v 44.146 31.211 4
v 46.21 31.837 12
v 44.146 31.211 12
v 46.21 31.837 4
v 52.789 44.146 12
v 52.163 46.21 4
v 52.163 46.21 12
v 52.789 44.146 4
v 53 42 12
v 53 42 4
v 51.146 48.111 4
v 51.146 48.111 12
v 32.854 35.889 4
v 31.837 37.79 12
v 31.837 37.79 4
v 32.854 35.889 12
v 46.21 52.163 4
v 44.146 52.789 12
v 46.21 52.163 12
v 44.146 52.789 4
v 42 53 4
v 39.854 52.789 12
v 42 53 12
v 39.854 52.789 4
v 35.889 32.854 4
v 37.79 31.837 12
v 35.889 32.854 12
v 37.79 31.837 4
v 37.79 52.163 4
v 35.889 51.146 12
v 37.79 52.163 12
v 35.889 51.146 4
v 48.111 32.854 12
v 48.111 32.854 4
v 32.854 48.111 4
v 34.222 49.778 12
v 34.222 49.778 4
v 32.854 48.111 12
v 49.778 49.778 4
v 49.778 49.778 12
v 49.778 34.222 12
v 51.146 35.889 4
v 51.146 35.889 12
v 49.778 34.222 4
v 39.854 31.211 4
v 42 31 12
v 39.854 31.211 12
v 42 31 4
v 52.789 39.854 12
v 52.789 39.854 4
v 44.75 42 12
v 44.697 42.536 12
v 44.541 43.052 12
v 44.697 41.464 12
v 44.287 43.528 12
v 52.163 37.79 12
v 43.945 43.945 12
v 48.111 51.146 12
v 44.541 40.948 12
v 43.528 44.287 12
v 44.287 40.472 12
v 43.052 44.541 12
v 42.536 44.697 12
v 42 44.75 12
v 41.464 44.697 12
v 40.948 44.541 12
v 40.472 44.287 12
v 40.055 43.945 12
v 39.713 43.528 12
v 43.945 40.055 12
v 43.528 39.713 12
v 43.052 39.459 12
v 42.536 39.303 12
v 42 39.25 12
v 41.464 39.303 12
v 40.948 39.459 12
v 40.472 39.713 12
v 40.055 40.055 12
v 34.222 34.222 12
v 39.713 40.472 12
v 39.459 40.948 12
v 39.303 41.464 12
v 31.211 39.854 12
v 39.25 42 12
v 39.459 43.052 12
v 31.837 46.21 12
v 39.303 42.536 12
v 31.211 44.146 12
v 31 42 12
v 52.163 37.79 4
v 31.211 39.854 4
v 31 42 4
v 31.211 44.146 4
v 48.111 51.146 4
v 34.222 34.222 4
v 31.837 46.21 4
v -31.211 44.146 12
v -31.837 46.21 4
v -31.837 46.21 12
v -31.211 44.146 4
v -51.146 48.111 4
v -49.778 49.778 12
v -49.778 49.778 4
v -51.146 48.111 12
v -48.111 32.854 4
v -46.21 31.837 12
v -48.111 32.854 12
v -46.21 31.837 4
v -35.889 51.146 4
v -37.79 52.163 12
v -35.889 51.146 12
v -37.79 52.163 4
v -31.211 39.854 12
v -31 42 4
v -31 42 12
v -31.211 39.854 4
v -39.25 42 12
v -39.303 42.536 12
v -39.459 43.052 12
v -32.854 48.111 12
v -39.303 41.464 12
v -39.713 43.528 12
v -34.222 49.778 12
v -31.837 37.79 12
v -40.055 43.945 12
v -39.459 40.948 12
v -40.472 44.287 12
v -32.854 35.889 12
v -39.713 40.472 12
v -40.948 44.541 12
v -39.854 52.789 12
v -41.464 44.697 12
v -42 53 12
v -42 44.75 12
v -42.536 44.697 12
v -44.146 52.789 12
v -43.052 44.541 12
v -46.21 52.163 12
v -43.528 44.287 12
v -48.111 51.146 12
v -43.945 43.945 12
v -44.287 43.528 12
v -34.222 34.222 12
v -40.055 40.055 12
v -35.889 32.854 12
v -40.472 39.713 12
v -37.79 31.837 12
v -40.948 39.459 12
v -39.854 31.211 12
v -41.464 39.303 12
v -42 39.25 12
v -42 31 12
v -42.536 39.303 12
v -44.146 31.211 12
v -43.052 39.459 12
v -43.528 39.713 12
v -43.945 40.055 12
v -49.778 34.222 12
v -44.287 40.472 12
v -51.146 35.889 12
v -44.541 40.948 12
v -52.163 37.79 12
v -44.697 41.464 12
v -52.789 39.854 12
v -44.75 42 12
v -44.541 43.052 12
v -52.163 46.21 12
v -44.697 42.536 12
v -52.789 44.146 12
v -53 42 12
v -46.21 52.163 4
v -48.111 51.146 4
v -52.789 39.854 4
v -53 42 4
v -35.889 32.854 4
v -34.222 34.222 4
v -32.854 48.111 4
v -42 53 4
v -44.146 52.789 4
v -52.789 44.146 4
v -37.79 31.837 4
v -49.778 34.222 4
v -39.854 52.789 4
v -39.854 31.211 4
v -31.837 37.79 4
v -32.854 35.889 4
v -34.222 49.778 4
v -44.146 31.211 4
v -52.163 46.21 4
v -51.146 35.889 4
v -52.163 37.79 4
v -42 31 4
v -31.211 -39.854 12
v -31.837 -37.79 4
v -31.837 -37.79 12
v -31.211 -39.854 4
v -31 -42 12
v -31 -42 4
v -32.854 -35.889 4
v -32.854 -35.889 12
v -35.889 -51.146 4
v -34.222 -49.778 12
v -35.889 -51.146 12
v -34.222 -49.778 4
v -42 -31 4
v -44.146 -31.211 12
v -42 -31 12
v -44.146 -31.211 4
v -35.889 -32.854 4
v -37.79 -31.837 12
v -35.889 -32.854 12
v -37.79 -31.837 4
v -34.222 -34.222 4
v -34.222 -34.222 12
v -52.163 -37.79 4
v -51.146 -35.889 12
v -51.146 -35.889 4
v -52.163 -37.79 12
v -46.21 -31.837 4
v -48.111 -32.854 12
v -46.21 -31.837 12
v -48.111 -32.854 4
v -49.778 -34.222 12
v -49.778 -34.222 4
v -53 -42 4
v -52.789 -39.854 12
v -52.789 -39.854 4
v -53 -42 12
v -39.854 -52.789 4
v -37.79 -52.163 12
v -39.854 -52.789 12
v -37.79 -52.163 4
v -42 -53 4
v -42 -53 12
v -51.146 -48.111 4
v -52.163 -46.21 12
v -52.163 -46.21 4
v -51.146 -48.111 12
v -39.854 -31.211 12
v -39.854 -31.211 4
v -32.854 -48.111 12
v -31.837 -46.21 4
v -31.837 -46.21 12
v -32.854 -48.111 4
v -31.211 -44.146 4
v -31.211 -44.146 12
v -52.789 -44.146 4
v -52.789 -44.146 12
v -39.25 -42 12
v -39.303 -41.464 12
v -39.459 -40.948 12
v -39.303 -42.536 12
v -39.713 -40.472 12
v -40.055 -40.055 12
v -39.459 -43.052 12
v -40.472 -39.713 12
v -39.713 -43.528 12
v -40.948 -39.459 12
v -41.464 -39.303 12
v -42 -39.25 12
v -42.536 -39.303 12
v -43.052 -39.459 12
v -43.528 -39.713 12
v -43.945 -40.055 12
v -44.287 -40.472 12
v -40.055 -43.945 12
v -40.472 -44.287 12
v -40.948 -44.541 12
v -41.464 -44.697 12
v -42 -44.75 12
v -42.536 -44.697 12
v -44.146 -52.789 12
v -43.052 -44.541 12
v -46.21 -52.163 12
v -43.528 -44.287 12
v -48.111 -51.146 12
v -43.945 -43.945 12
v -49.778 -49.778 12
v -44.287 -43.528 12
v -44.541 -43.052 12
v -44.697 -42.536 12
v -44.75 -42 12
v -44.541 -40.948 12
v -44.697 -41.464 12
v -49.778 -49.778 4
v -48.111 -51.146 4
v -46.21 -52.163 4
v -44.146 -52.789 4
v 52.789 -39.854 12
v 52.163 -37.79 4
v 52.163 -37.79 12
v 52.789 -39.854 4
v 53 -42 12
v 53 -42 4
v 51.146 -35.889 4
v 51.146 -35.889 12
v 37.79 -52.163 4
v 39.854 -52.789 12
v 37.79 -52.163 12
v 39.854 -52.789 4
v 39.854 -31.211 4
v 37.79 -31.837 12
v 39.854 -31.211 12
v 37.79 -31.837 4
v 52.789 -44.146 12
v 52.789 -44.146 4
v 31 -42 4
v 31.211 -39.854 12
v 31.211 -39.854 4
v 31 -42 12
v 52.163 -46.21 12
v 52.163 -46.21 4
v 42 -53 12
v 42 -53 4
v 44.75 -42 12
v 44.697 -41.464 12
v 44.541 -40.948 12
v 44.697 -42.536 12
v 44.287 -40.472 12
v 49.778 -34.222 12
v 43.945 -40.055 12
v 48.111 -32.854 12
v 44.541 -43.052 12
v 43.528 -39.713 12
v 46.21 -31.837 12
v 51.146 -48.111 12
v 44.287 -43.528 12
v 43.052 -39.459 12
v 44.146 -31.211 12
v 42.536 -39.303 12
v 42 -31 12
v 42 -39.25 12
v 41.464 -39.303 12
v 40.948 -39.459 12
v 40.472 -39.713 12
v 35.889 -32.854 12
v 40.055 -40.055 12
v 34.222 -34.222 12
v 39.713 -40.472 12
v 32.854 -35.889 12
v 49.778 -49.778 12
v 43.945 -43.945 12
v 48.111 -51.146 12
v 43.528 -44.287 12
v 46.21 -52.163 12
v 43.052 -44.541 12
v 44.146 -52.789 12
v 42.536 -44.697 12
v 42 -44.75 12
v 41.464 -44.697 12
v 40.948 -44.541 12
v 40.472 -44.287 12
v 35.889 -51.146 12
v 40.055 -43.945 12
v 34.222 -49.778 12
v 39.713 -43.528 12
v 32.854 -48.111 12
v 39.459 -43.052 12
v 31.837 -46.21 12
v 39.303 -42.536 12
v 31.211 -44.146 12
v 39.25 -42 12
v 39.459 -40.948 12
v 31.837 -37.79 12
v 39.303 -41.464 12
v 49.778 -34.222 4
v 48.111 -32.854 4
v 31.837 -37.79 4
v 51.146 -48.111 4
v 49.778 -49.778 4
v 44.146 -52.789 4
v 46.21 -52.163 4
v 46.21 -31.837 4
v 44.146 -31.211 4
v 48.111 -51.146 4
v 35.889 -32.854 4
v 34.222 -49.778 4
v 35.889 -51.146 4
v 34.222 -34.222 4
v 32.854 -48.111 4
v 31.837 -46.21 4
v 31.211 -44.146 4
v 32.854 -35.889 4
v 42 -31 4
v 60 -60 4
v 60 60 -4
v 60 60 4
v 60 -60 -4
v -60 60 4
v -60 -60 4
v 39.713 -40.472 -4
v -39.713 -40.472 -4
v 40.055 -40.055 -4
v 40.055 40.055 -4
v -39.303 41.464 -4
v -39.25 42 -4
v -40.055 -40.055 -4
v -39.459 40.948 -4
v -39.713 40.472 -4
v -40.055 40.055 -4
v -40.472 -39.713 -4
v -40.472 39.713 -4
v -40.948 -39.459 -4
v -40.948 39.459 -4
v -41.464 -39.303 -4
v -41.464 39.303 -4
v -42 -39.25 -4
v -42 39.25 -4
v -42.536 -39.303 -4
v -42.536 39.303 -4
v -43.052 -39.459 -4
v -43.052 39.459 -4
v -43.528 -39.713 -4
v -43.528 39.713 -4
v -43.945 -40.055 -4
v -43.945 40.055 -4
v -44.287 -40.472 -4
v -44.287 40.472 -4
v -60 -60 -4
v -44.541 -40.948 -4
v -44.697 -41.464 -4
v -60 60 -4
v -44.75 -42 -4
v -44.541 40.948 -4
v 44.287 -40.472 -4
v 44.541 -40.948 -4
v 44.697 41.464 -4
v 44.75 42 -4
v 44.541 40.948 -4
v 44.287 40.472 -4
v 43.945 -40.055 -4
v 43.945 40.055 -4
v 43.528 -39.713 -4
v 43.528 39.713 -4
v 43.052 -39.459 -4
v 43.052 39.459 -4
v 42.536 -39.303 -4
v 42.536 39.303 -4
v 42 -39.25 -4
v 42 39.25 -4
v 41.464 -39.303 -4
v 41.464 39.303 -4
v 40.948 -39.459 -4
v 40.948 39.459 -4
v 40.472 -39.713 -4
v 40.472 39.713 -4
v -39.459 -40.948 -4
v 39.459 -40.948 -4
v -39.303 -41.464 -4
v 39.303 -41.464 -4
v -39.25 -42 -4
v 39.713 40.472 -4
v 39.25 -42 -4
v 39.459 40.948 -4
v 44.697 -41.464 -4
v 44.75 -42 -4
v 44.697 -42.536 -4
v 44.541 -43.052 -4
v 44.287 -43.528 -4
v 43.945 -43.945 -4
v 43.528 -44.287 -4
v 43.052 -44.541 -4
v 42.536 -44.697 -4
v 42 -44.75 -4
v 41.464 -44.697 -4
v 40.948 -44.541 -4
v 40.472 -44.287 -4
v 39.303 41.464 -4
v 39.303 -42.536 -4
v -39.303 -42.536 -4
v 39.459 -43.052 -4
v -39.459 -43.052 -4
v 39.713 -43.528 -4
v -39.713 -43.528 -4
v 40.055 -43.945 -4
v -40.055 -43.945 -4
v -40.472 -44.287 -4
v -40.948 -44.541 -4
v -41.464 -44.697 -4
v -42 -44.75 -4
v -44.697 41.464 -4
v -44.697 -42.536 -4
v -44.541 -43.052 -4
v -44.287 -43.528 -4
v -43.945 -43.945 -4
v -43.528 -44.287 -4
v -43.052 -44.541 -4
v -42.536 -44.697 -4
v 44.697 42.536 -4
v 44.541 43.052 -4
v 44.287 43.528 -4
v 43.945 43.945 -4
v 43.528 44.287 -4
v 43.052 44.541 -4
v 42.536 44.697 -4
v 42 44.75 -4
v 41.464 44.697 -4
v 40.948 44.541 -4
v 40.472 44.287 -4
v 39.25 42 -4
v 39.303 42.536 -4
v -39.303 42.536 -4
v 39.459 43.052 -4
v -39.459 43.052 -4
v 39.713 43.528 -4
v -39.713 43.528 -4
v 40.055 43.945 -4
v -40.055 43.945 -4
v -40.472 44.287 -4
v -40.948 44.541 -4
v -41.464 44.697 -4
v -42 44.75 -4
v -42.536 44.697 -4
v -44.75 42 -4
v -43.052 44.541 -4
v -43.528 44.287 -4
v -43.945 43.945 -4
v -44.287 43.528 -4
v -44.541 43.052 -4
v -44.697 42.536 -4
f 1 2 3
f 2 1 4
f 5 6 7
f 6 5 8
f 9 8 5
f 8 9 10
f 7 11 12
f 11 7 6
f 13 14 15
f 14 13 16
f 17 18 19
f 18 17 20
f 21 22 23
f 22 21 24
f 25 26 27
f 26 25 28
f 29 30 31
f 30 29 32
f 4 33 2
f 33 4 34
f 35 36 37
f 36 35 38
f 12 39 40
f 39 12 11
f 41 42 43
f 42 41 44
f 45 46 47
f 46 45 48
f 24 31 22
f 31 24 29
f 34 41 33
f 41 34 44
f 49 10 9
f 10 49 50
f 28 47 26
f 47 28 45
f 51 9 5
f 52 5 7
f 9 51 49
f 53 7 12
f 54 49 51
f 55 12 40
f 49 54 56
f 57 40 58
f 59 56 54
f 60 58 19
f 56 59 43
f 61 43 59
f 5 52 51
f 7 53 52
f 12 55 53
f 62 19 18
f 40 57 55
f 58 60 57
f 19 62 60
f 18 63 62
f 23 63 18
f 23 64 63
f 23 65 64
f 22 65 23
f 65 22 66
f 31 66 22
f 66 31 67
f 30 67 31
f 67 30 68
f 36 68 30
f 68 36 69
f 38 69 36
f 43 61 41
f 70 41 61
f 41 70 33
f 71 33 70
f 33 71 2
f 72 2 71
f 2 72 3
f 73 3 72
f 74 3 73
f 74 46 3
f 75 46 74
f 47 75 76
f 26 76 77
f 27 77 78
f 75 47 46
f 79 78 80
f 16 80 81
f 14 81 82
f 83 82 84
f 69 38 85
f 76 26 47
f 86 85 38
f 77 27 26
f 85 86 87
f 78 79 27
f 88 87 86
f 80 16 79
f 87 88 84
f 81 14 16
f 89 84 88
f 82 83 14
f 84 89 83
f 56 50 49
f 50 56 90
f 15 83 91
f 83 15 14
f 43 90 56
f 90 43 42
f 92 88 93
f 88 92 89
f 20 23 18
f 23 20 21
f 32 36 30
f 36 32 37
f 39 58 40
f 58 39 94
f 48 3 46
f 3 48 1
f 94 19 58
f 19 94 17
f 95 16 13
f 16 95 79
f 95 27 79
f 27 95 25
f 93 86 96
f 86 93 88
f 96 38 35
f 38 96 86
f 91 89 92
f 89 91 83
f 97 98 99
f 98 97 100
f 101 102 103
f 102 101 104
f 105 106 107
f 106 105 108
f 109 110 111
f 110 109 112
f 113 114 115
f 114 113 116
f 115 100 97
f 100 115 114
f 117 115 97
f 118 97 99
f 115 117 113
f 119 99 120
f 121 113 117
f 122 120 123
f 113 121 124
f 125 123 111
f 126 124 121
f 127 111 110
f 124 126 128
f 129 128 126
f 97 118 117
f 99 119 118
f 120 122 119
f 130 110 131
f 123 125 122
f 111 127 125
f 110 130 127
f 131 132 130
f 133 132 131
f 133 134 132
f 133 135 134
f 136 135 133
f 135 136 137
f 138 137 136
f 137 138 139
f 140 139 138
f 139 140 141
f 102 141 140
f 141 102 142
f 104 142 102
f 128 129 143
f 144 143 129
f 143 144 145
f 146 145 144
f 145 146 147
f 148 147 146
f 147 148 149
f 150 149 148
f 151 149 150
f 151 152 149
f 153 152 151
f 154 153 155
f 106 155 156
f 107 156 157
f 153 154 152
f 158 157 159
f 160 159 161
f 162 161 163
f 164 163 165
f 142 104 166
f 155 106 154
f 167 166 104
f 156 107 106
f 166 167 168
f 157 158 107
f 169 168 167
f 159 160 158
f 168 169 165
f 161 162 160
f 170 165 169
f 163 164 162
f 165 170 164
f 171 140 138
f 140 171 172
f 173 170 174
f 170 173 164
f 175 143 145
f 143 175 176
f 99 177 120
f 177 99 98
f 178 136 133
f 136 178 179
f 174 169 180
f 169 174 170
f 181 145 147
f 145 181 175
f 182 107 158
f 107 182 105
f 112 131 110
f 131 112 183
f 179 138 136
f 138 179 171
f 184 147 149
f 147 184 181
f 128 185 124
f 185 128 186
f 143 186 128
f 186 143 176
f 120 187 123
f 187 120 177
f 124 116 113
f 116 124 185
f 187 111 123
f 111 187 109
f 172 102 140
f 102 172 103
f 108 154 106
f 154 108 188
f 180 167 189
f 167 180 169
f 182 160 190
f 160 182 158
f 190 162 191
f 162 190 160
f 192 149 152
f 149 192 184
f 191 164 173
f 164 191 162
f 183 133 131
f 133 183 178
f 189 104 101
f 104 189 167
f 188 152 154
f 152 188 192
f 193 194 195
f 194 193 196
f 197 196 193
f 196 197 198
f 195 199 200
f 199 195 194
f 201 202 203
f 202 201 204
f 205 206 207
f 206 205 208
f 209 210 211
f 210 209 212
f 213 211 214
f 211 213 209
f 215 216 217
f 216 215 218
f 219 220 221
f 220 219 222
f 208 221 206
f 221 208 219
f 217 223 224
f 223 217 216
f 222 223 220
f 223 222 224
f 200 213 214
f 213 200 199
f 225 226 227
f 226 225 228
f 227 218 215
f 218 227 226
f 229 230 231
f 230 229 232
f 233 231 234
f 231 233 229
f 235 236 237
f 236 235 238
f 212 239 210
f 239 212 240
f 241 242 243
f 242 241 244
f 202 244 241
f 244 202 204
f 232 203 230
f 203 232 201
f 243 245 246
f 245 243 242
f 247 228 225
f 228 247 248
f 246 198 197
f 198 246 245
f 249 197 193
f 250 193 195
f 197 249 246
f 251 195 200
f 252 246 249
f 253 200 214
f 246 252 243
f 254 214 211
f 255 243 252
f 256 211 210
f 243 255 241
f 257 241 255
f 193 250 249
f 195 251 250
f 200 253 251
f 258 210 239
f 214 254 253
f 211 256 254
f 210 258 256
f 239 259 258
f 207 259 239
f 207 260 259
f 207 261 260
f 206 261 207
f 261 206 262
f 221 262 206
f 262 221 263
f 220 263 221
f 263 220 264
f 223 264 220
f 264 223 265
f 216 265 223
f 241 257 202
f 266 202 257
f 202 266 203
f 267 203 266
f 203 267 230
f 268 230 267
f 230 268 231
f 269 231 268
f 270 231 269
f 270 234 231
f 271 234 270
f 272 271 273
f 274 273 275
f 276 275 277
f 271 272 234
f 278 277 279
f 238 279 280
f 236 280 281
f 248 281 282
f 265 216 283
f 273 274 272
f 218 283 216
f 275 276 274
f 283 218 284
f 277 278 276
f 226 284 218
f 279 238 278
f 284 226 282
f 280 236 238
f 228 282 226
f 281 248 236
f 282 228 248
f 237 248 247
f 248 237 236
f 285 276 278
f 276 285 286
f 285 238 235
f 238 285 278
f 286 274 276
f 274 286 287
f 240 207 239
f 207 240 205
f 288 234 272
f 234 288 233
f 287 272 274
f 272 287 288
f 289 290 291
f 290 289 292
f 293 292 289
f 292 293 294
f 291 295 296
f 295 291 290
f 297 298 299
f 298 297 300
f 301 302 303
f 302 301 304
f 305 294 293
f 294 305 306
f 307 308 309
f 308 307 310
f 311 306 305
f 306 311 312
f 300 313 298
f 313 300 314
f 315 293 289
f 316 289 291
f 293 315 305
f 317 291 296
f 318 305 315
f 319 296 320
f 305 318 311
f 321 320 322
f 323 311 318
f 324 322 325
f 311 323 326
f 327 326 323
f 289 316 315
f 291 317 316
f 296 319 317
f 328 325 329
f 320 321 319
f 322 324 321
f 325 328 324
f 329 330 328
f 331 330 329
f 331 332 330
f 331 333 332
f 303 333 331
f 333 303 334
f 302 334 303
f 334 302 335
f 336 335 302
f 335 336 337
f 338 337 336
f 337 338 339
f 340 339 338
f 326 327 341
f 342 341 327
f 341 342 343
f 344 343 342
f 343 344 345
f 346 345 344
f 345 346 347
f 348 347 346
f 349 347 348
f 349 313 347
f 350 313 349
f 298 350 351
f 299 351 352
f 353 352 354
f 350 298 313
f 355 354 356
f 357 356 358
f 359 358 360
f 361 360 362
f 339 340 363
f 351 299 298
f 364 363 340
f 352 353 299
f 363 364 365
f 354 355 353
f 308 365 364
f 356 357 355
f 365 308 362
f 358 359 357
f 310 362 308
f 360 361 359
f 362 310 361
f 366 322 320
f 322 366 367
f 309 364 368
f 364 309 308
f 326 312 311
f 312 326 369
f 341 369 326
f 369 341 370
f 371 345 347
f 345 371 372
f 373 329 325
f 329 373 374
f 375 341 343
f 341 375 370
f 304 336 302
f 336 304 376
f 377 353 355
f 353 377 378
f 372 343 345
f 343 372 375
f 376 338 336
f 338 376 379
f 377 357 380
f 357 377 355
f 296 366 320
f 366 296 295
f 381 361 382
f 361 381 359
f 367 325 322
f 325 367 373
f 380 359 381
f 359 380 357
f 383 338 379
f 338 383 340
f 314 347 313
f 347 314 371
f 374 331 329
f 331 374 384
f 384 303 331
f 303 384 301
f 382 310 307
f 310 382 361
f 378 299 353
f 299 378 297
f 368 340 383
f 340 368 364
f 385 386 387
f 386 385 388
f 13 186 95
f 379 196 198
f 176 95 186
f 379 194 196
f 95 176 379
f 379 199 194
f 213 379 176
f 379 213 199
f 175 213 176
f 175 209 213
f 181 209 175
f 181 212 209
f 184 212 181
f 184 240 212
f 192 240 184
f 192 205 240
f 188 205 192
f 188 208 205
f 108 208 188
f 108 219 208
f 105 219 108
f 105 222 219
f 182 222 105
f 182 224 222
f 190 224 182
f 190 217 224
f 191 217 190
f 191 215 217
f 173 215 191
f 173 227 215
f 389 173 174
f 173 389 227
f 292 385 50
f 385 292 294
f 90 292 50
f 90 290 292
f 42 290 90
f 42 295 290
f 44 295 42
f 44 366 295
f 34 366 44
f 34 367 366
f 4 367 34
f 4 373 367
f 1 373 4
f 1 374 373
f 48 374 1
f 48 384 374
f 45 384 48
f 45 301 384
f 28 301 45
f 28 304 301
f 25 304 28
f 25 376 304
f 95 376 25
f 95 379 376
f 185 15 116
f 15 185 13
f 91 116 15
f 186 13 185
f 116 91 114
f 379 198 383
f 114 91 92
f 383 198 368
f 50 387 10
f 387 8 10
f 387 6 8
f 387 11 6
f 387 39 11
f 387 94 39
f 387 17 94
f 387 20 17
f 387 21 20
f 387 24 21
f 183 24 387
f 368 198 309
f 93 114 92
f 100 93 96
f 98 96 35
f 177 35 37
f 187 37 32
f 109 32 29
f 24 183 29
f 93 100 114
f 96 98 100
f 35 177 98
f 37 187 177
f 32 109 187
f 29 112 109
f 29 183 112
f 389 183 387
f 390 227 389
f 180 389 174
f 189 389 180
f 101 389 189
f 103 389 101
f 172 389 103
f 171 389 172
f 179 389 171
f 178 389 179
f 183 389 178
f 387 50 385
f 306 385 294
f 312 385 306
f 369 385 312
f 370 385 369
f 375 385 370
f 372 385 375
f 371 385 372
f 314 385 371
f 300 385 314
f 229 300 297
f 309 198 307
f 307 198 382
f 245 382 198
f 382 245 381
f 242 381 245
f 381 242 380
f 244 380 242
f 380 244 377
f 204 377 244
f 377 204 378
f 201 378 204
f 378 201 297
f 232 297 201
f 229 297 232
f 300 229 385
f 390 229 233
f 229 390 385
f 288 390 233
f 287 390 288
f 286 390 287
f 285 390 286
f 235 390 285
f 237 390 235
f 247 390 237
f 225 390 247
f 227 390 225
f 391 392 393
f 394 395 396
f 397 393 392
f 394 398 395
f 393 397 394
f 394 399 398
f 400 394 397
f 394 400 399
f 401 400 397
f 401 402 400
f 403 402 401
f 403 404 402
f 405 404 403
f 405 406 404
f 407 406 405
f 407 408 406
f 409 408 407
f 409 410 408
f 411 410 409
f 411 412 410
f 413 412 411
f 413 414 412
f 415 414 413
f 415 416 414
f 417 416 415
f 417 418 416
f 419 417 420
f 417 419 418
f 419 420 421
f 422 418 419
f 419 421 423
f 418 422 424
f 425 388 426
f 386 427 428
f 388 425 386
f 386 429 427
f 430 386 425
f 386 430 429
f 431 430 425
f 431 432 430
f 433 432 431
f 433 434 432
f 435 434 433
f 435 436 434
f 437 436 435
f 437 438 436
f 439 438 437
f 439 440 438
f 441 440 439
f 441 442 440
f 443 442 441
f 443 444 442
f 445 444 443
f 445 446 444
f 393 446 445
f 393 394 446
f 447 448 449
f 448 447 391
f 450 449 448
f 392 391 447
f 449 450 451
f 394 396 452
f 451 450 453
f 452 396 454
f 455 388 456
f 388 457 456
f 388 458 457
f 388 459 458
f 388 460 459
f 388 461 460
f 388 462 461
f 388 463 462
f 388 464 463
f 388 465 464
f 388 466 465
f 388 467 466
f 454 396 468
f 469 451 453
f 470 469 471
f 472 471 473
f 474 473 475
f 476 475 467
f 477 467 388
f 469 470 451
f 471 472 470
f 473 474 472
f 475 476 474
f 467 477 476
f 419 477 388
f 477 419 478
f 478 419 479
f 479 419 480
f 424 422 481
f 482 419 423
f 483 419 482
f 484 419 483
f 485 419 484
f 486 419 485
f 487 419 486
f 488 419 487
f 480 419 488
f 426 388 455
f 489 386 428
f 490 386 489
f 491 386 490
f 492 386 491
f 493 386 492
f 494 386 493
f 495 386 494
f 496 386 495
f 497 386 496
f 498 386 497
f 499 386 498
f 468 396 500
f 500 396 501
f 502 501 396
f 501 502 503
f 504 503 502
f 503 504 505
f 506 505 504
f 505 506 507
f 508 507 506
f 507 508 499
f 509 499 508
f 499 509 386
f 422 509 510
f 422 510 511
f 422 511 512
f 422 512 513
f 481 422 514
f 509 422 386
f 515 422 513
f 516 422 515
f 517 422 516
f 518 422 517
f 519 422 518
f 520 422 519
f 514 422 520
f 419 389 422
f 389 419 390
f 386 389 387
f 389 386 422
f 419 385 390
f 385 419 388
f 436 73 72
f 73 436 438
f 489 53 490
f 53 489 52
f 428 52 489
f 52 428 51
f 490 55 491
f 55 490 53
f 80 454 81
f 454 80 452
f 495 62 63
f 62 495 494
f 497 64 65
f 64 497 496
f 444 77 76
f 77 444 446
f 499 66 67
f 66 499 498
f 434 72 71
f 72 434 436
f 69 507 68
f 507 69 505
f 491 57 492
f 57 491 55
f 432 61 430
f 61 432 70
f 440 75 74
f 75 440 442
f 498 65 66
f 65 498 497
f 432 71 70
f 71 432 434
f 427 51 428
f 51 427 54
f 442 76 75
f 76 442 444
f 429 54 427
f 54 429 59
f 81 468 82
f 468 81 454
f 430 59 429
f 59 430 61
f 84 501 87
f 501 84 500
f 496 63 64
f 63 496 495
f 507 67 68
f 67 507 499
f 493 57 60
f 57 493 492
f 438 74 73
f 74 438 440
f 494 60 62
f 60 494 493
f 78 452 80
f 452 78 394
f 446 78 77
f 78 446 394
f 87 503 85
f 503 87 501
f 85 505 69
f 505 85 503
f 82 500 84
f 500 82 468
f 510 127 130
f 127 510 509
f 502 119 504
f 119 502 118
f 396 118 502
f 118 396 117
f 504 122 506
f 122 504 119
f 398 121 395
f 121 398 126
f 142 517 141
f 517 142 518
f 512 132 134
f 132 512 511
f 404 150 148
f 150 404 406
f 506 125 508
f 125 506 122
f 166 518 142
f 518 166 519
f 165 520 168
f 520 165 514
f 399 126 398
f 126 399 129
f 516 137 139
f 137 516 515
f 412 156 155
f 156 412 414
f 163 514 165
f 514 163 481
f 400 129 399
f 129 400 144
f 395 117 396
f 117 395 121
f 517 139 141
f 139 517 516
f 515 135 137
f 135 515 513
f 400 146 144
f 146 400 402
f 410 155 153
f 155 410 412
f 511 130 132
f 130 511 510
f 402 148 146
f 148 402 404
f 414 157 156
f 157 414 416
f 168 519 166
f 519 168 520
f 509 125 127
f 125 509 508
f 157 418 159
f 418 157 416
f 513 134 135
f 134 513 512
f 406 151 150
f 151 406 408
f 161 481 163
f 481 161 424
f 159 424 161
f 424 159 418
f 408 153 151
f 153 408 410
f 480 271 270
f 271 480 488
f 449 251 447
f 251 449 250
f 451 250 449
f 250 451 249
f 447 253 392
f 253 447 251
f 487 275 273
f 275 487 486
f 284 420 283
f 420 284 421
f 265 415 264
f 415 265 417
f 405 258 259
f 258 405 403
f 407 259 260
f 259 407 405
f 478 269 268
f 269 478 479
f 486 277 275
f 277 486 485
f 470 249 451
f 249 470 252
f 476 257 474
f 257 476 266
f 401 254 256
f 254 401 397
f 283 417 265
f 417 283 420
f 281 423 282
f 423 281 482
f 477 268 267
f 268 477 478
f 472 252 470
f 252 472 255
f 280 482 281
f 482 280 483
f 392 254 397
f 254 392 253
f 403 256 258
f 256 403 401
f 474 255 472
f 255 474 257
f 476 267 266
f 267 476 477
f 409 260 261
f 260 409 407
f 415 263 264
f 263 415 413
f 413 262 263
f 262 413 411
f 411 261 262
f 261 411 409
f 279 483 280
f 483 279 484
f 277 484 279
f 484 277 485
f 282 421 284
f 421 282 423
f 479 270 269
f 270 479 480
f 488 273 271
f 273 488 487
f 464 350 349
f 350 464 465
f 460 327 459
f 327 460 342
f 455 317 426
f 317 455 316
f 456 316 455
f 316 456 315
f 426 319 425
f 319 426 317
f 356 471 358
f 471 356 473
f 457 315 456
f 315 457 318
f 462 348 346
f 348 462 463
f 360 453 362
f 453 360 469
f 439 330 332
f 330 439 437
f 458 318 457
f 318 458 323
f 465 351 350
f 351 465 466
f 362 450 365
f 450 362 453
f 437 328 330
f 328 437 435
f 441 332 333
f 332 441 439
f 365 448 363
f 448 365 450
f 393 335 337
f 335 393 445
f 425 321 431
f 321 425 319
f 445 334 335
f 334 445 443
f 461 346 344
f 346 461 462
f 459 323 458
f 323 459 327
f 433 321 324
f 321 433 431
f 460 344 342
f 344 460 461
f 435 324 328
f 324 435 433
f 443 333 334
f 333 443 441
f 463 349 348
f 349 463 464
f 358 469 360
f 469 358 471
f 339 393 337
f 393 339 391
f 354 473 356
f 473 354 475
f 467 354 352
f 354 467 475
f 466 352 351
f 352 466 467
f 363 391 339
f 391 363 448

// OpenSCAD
$fn = 32;

// ----------------------------------------------------------------------
// Anchor pads 120 x 120 x 16
// four corner bosses with anchor holes
// ----------------------------------------------------------------------

// --- parameters (mm) ---
plate = [120, 120, 8];  // base plate size (x, y, z)
pads = 4;               // boss count, one per corner
edge = 18;              // boss centre offset from the plate edge
boss_d = 22;            // boss diameter
boss_h = 8;             // boss height above the base plate
hole_d = 5.5;           // hole diameter

// --- derived feature positions (mm) ---
height = plate[2] + boss_h;      // = 16   overall height of the part
corner_x = plate[0] / 2 - edge;  // = 42   boss centre X
corner_y = plate[1] / 2 - edge;  // = 42   boss centre Y
feature_centers = [
  [corner_x, corner_y],
  [-corner_x, corner_y],
  [-corner_x, -corner_y],
  [corner_x, -corner_y]
];   // boss centres, anchor holes are drilled there

// base plate, four bosses standing on it, anchor holes all the way through
difference() {
  union() {
    cube(plate, center = true);
    for (centre = feature_centers)
      translate([centre[0], centre[1], plate[2] / 2 - 1])
        cylinder(d = boss_d, h = boss_h + 1);
  }
  for (centre = feature_centers)
    translate([centre[0], centre[1], -height])
      cylinder(d = hole_d, h = 2 * height + 2);  // through boss and plate
}
